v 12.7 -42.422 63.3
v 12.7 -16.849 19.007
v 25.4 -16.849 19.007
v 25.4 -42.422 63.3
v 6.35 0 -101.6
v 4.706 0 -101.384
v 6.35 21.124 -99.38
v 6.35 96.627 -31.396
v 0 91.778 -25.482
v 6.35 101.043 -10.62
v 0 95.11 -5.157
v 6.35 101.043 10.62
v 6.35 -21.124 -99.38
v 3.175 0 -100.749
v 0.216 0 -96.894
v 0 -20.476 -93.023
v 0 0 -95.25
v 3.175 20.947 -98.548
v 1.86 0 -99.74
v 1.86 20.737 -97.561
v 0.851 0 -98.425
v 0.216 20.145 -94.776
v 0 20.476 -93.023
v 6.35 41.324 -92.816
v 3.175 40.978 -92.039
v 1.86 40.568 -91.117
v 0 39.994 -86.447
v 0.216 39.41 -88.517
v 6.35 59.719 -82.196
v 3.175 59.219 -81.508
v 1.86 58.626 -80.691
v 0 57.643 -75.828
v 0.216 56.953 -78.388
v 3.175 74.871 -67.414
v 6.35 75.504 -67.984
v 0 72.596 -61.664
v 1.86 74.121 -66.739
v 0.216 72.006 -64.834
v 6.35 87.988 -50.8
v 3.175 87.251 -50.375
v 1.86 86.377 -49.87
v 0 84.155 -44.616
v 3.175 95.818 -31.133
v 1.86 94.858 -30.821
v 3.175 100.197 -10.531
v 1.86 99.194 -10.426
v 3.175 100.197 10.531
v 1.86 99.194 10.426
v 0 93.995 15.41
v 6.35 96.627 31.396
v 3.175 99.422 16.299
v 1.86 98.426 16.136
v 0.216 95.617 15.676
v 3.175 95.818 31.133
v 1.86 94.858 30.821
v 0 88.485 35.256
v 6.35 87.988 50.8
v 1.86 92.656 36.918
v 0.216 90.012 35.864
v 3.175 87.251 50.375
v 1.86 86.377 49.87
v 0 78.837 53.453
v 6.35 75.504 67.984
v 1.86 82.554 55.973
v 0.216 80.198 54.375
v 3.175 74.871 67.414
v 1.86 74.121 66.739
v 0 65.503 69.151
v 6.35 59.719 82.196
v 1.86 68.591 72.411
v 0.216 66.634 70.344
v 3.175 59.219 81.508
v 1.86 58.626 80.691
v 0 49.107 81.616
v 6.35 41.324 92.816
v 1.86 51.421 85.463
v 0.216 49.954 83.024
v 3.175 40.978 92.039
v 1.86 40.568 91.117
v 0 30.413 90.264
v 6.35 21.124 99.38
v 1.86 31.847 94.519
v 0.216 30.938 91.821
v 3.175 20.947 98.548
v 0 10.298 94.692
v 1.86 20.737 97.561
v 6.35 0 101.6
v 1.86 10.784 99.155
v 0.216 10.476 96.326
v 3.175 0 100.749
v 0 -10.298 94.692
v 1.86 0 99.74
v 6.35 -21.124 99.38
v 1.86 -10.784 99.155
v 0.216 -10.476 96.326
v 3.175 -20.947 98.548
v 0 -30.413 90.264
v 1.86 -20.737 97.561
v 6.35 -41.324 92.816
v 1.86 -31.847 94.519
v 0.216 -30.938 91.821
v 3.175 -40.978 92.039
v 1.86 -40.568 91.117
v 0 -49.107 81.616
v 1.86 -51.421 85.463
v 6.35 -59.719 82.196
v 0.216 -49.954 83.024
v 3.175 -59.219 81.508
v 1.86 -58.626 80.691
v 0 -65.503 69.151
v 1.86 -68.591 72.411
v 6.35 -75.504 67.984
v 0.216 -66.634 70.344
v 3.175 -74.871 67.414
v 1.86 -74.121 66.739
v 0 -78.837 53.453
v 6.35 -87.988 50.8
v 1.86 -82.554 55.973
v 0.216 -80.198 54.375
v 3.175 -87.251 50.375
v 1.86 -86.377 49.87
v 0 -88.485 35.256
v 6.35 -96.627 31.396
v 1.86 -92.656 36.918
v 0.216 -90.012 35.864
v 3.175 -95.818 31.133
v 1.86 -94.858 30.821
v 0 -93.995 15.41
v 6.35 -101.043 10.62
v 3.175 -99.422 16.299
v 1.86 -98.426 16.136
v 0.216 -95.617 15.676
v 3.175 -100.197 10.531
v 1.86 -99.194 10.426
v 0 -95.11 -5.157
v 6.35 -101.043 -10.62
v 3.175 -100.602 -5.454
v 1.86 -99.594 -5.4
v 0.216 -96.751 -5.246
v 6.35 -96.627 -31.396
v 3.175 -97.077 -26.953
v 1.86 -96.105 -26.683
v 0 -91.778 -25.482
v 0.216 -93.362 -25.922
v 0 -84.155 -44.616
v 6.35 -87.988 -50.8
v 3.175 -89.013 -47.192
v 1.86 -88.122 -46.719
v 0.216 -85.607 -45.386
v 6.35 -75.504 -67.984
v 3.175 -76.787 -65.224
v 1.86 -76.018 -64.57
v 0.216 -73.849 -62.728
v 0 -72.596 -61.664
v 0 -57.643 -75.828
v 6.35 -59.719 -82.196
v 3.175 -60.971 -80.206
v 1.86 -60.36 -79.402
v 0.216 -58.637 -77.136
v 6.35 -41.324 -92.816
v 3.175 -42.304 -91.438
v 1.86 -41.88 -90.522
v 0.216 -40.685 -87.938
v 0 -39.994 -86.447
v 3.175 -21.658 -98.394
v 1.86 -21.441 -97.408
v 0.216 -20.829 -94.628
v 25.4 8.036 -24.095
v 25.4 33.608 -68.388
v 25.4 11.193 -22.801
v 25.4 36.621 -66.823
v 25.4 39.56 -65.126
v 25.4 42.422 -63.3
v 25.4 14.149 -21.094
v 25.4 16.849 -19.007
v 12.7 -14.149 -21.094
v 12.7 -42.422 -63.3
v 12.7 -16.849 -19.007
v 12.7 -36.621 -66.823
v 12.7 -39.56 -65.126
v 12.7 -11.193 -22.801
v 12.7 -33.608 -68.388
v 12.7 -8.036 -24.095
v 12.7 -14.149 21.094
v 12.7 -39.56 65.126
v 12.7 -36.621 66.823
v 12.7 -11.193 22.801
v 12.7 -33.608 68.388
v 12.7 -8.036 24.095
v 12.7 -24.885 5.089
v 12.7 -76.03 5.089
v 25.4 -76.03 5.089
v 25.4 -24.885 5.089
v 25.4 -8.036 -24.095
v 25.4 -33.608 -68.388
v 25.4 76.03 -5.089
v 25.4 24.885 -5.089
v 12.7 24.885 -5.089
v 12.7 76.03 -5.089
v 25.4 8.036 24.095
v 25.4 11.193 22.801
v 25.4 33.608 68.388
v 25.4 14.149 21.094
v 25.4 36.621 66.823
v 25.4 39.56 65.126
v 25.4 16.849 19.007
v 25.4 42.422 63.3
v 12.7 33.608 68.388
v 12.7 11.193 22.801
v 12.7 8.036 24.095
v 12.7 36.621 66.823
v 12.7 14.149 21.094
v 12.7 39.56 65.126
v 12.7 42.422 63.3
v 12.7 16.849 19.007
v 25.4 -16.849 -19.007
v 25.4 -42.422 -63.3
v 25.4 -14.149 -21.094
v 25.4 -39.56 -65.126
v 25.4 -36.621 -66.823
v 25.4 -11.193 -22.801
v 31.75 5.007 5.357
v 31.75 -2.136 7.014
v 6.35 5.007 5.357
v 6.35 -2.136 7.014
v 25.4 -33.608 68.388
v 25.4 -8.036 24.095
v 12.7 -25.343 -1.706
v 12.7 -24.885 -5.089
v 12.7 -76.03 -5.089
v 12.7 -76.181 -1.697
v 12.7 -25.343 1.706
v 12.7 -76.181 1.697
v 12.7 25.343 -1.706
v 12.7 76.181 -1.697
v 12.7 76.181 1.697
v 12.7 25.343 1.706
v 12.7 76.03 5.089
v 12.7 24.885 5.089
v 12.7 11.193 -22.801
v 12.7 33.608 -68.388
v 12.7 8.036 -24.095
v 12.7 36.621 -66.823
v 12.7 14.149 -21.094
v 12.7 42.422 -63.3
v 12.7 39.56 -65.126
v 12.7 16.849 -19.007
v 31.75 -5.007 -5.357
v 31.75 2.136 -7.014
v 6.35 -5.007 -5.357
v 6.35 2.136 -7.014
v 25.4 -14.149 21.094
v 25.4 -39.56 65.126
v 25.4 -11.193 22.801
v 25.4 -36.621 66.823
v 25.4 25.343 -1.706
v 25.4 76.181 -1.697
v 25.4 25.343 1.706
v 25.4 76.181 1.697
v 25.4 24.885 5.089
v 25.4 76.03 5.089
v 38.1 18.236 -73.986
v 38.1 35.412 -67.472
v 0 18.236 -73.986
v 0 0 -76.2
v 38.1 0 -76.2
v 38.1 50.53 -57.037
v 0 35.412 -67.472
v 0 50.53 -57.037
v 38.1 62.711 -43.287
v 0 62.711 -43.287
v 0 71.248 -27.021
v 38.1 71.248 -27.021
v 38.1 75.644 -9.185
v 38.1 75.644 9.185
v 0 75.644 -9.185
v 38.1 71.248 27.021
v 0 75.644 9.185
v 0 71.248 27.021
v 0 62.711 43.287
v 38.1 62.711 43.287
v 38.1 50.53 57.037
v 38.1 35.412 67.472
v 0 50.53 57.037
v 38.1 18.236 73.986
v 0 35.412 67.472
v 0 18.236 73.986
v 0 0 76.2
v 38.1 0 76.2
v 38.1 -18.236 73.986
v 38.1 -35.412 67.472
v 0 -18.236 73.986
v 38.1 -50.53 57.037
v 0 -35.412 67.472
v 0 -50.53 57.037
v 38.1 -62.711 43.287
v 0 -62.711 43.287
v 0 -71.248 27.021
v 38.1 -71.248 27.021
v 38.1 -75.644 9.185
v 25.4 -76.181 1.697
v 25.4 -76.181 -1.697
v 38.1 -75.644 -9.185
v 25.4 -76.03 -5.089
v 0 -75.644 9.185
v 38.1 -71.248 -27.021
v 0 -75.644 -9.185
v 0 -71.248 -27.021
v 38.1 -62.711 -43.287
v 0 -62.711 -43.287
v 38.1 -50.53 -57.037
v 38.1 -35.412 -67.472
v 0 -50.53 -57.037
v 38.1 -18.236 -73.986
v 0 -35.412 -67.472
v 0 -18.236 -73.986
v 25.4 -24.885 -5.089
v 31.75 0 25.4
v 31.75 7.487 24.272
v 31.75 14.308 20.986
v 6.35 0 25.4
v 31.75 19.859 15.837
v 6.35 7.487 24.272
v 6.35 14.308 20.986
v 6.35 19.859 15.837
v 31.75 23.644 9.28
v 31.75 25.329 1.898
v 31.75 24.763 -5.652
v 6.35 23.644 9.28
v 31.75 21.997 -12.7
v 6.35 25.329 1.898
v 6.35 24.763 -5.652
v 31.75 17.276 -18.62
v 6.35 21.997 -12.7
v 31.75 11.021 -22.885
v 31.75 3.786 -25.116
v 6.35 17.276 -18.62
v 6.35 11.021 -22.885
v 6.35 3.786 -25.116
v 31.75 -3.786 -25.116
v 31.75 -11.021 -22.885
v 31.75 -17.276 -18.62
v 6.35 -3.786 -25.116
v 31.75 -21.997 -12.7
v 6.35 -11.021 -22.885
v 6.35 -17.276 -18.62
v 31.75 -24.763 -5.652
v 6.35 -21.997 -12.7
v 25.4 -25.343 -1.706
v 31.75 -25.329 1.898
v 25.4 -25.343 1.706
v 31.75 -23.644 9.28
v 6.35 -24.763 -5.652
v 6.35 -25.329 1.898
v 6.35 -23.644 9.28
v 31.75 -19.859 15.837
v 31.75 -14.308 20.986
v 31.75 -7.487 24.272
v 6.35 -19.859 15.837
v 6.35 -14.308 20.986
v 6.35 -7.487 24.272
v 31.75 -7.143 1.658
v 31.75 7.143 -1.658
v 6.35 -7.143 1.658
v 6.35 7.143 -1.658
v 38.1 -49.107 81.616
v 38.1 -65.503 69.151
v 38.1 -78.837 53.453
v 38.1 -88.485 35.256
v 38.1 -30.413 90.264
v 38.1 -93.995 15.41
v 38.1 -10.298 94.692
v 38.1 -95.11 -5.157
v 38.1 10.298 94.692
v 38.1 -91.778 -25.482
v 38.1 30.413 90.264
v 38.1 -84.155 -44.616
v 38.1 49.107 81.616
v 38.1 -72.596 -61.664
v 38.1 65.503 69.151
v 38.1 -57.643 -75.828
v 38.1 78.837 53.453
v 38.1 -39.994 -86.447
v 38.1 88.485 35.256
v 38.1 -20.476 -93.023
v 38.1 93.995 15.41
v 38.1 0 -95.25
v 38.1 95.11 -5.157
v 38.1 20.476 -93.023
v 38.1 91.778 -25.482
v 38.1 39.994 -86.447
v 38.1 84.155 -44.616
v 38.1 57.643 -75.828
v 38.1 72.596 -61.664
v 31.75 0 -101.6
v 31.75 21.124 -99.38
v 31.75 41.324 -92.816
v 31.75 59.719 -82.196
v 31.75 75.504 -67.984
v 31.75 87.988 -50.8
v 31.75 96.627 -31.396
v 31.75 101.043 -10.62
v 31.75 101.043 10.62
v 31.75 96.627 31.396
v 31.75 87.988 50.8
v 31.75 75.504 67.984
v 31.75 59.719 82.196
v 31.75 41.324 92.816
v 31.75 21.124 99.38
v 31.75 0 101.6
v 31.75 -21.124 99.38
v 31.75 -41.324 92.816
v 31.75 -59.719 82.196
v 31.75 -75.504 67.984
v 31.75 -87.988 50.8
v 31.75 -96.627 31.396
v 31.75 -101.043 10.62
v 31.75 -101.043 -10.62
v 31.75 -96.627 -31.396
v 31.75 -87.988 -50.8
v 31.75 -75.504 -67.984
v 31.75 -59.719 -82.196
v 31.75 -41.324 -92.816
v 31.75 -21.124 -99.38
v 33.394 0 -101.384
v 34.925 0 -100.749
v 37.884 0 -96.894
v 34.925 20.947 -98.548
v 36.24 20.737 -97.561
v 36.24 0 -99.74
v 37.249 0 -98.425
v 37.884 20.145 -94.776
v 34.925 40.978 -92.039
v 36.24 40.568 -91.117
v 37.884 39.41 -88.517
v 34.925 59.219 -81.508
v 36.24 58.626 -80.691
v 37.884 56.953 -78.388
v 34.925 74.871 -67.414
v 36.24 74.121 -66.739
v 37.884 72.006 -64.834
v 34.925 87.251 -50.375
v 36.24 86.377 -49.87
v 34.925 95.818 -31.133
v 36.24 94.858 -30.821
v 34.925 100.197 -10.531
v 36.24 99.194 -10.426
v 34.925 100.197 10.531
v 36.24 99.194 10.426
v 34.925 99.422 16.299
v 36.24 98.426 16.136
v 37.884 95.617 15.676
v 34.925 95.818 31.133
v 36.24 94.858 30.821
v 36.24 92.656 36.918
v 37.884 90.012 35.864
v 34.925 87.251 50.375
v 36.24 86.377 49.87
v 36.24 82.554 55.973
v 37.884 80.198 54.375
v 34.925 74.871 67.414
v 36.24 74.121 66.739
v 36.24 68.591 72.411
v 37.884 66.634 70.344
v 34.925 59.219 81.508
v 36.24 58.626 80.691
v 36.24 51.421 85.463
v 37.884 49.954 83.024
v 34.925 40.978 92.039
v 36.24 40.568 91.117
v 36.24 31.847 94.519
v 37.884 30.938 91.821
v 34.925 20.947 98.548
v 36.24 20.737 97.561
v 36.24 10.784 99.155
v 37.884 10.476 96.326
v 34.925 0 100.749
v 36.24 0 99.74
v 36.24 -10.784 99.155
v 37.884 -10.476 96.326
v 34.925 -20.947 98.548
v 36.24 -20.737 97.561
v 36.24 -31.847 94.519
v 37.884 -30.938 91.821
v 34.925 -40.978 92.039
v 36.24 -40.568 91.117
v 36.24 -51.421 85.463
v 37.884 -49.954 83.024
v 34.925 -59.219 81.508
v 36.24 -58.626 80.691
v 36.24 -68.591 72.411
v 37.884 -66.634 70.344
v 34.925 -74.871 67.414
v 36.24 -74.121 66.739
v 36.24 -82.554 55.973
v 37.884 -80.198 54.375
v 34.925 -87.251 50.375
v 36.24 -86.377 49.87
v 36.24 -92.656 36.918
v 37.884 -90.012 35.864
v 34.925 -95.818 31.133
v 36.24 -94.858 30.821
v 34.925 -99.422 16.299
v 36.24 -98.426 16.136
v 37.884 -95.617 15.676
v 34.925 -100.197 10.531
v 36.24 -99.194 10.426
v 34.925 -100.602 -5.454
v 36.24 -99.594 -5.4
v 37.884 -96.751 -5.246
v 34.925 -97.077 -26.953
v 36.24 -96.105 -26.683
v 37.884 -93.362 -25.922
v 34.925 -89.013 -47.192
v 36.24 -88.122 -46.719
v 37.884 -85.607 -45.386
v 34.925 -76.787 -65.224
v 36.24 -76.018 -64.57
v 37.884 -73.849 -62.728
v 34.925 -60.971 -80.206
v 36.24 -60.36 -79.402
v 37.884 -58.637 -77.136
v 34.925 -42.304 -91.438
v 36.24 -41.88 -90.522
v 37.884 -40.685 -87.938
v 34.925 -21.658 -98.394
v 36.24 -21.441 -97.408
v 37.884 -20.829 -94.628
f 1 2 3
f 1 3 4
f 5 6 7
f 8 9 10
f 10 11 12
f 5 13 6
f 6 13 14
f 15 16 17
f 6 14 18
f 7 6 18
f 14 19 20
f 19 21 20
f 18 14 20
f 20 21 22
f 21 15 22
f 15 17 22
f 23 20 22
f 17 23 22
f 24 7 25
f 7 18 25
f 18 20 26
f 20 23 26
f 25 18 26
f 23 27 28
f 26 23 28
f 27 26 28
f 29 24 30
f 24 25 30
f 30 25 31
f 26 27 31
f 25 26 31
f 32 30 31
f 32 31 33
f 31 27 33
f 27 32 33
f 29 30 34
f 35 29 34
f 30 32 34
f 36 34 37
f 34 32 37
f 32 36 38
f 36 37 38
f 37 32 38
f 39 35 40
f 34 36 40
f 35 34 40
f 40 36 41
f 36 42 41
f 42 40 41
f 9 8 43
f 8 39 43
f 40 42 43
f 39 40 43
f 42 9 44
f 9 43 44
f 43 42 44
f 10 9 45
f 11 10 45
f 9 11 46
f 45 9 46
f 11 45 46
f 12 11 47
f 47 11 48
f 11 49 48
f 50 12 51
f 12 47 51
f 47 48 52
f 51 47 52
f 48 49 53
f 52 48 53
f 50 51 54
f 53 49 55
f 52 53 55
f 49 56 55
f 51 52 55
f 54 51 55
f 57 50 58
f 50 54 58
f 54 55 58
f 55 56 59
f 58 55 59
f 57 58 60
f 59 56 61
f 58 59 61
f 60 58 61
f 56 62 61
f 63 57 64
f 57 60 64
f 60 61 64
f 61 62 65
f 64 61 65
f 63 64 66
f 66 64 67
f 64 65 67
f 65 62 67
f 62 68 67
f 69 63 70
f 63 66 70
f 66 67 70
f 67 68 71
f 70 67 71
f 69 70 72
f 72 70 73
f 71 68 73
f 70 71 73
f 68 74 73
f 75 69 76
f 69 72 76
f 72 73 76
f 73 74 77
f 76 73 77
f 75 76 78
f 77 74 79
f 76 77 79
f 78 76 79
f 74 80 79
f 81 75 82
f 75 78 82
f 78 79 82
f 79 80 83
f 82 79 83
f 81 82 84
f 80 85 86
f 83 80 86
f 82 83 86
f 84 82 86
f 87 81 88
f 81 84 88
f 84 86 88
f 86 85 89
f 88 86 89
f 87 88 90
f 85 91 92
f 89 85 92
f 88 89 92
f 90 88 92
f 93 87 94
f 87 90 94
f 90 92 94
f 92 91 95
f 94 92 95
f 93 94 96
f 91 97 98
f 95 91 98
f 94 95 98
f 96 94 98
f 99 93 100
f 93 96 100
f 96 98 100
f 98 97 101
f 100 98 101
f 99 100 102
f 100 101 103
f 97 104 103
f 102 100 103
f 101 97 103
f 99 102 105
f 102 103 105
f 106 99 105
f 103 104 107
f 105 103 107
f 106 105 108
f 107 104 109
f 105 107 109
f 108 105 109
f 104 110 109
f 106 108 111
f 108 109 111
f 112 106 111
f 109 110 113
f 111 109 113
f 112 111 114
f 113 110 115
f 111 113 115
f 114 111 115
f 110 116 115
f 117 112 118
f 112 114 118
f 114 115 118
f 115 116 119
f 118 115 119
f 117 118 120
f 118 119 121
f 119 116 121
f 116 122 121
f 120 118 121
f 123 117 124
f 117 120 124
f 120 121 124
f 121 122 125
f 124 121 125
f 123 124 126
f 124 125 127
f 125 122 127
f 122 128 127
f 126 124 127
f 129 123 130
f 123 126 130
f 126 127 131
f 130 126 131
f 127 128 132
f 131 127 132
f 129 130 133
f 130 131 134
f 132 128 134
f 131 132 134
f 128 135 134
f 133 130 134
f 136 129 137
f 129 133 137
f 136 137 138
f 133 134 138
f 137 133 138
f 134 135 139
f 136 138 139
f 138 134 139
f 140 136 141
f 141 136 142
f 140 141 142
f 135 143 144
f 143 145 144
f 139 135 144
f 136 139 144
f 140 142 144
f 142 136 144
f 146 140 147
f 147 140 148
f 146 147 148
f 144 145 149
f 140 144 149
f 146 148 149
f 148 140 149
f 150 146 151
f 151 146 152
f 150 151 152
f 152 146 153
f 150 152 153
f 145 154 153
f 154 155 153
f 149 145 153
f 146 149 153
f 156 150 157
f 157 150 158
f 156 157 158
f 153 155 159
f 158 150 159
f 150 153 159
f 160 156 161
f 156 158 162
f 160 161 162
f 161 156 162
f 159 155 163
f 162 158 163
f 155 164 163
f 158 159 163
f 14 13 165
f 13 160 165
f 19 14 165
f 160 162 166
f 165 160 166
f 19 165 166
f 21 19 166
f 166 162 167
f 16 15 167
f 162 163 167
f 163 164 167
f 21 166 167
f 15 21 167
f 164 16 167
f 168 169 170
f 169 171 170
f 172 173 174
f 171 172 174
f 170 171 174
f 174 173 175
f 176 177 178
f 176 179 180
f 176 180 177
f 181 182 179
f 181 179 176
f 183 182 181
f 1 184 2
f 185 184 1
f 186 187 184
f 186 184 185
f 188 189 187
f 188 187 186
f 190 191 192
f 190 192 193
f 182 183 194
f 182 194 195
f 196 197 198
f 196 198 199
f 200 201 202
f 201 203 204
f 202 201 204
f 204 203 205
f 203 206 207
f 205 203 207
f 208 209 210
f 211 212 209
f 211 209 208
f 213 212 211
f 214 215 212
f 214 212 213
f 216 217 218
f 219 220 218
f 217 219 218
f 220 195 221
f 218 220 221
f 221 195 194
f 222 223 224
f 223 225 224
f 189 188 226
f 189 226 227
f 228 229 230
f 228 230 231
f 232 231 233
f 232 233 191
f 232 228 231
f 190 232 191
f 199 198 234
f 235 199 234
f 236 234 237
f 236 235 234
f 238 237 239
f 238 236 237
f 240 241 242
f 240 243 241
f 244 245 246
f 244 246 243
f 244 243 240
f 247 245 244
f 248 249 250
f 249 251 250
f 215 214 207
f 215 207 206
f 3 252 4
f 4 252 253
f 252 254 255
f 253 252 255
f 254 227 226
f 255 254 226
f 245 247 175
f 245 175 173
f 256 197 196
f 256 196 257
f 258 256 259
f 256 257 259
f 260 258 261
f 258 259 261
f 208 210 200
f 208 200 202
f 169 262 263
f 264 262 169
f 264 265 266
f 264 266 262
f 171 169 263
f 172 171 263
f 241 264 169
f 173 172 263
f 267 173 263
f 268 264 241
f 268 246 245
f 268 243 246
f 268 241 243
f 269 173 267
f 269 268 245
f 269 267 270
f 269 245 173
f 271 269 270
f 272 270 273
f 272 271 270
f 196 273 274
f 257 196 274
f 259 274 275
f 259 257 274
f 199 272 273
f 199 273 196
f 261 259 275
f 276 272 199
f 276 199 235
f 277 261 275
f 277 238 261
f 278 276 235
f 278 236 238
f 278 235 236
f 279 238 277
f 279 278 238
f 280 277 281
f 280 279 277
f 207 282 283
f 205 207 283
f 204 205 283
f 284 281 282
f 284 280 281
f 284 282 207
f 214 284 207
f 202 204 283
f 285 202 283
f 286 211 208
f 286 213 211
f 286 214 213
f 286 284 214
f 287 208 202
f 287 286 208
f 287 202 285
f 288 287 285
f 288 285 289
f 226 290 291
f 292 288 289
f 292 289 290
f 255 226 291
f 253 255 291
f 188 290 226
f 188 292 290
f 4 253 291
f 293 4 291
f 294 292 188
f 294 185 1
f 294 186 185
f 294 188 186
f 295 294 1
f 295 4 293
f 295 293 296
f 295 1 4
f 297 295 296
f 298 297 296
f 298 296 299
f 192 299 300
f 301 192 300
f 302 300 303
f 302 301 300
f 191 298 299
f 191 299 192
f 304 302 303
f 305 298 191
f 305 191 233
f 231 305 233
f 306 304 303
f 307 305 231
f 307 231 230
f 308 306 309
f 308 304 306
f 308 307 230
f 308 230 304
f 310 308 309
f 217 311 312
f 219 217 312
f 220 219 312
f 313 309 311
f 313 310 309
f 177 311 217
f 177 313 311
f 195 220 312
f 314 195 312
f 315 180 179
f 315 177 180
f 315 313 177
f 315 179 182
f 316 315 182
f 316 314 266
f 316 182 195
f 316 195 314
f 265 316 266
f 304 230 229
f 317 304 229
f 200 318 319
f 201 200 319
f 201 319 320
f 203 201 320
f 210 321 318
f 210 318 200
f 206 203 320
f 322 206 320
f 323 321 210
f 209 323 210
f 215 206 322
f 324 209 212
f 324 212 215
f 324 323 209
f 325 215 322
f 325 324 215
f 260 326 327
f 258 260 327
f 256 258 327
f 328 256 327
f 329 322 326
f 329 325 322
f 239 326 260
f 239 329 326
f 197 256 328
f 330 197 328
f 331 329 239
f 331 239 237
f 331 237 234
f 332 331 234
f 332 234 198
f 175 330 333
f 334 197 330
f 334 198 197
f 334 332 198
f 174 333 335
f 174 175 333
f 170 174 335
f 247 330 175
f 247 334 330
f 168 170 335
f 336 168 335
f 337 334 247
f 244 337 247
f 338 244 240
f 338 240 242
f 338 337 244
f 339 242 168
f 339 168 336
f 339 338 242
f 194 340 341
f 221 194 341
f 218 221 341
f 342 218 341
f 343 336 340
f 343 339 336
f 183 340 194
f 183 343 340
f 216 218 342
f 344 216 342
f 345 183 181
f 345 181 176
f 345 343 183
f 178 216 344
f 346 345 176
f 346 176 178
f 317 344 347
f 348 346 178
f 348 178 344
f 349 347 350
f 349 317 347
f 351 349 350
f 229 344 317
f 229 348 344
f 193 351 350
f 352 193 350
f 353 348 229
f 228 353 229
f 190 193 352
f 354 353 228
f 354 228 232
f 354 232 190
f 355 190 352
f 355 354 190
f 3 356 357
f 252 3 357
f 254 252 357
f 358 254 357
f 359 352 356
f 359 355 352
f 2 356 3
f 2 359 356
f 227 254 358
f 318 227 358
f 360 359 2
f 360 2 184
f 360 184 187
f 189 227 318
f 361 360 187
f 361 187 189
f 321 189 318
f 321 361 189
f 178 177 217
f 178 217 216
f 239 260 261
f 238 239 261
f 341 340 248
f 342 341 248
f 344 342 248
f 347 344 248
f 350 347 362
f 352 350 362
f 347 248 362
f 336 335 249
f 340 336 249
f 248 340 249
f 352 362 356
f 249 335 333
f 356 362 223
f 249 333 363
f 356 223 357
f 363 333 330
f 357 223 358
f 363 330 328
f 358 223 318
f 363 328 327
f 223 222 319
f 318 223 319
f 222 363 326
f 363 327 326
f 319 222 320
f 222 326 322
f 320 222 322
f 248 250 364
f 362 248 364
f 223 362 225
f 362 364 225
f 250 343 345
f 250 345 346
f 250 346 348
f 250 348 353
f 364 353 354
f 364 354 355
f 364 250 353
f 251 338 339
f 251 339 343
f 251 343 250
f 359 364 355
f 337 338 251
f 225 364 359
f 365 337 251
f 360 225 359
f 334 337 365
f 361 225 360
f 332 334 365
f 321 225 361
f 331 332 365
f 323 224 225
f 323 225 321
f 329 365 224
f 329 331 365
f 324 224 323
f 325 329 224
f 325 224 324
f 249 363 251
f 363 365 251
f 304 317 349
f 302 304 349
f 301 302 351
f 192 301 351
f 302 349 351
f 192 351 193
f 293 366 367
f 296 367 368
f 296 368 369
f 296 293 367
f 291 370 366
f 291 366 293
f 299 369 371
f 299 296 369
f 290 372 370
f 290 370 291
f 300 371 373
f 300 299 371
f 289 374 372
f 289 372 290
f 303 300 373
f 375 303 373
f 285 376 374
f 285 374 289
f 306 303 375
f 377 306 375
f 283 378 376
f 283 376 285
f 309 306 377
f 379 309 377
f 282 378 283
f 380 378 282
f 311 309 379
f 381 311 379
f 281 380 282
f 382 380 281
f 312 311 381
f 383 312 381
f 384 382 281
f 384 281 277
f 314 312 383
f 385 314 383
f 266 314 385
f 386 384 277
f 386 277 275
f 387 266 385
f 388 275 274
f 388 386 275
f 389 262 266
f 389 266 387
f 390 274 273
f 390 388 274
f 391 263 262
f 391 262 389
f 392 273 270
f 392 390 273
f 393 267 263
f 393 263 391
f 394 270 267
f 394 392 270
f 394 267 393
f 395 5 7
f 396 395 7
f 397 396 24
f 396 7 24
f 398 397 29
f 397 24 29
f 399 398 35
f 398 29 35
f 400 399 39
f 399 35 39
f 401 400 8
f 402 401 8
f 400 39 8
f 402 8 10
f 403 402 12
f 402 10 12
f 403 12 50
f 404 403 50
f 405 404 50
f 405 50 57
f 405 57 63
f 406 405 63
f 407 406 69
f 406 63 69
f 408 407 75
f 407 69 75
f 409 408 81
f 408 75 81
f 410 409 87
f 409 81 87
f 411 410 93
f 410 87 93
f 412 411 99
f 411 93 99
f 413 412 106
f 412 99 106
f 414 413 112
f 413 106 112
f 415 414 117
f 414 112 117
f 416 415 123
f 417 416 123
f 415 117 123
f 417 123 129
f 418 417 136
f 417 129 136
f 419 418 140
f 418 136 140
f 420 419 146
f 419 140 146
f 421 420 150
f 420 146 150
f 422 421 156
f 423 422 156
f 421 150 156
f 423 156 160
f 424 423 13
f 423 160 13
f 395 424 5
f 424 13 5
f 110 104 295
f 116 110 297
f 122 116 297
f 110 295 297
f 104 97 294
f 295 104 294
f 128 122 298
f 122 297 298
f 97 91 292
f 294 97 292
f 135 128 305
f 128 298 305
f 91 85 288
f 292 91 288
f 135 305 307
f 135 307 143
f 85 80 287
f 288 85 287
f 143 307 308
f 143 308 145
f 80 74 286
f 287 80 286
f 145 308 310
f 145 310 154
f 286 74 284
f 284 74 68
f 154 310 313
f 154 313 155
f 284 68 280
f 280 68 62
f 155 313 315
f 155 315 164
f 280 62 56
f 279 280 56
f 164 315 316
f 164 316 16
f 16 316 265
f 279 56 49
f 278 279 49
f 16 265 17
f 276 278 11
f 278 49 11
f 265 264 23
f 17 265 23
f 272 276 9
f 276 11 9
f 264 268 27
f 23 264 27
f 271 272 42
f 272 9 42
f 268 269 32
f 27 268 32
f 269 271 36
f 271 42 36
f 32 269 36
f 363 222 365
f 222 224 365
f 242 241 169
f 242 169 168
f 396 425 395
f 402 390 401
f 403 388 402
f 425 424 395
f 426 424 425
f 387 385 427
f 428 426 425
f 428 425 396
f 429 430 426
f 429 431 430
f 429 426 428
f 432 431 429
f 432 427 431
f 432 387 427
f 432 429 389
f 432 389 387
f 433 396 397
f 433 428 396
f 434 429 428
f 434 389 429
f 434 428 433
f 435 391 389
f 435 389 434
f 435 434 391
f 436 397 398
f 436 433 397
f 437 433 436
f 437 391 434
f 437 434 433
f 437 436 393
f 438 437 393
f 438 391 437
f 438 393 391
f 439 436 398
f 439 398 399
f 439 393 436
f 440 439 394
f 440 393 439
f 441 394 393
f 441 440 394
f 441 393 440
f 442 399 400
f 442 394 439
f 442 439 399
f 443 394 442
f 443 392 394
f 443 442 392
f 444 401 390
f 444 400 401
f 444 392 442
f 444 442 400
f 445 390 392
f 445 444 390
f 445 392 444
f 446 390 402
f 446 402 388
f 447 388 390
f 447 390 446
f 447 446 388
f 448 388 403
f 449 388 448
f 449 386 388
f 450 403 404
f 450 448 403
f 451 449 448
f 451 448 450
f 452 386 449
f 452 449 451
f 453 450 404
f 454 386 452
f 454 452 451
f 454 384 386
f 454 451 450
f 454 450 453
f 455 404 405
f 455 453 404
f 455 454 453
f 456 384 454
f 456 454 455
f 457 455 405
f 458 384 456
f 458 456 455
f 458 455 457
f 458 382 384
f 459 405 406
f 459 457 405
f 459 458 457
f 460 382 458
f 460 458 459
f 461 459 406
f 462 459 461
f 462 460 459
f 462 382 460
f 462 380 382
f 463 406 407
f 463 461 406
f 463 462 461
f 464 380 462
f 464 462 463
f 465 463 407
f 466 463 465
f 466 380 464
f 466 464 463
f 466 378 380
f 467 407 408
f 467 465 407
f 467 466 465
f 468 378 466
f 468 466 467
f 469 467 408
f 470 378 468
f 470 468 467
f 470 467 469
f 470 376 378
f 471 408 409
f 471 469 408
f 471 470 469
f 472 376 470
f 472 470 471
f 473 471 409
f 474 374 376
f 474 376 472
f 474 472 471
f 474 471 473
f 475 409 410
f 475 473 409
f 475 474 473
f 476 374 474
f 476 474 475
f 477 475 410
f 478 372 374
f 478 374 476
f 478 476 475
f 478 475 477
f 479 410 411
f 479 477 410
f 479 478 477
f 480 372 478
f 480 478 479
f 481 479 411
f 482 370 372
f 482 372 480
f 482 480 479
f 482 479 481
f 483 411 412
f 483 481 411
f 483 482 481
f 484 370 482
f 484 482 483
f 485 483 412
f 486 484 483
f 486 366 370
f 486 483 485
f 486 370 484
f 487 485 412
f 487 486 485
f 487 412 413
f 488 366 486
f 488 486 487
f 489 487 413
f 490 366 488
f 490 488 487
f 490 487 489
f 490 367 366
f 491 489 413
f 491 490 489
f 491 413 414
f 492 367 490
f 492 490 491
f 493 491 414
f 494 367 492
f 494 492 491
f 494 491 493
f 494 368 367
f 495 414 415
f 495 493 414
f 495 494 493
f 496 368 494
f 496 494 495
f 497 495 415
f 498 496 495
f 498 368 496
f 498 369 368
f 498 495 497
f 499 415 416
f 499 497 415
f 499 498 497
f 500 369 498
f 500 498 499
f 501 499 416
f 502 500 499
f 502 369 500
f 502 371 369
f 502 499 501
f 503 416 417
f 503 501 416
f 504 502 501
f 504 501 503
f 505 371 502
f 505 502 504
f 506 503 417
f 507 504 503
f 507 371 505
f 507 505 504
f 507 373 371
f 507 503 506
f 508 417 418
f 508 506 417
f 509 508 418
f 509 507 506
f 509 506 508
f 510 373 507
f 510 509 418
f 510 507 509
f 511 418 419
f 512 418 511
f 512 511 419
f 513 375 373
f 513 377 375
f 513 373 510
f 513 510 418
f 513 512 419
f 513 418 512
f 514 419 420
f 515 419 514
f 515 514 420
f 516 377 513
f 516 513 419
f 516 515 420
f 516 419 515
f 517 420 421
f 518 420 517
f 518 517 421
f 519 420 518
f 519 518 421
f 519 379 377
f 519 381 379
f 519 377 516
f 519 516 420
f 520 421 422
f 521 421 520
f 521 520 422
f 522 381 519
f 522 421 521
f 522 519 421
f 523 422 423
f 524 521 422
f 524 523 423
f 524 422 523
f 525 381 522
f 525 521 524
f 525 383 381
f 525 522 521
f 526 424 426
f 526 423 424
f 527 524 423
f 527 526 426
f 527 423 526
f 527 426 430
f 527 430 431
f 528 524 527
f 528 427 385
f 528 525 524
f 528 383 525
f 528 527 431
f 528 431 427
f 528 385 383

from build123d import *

# Parameters (mm, degrees)
SKETCH1_R                = 101.6
SKETCH1_R_2              = 76.2
BOSS_EXTRUDE1_DEPTH      = 38.1
FILLET1_R                = 6.35
SKETCH2_R                = 25.4
BOSS_EXTRUDE2_DEPTH      = 12.7
BOSS_EXTRUDE2_DEPTH_BACK = 12.7
SKETCH3_W                = 10.17723869
SKETCH3_H                = 65.923797021
BOSS_EXTRUDE3_DEPTH      = 6.35
BOSS_EXTRUDE3_DEPTH_BACK = 6.35


with BuildPart() as part:
    # Sketch1 → Boss-Extrude1 (new body)
    with BuildSketch(Plane(origin=(0, 0, 0), x_dir=(0, 0, -1), z_dir=(1, 0, 0))):
        Circle(SKETCH1_R)
        Circle(SKETCH1_R_2, mode=Mode.SUBTRACT)
    extrude(amount=BOSS_EXTRUDE1_DEPTH)

    # Fillet1
    fillet1_edges = [part.edges().sort_by_distance(p)[0] for p in [
        (0, 0, 101.6),
        (38.1, 0, 101.6),
    ]]
    fillet(fillet1_edges, radius=FILLET1_R)



with BuildPart() as body_2:
    # Sketch2 → Boss-Extrude2 (new body, two sides)
    with BuildSketch(Plane.ZY.offset(-19.05)) as boss_extrude2_sk:
        Circle(SKETCH2_R)
        Polygon((-5.356755209, -5.00684601), (1.657678233, -7.142509098), (7.014433442, -2.135663088), (5.356755209, 5.00684601), (-1.657678233, 7.142509098), (-7.014433442, 2.135663088), align=None, mode=Mode.SUBTRACT)
    extrude(amount=BOSS_EXTRUDE2_DEPTH)
    extrude(boss_extrude2_sk.sketch, amount=-BOSS_EXTRUDE2_DEPTH_BACK)


with BuildPart() as part_1:
    add(part.part)

    add(body_2.part)  # Boss-Extrude3 merges body 2
    # Sketch3 → Boss-Extrude3 (add, two sides)
    with BuildSketch(Plane.ZY.offset(-19.05)) as boss_extrude3_sk:
        Polygon((6.933069311, 9.87864093), (12.021688656, 1.064893684), (69.11337159, 34.026792195), (64.024752245, 42.840539441), align=None)
        with Locations((0, 43.905433126)):
            Rectangle(SKETCH3_W, SKETCH3_H)
        Polygon((12.021688656, -1.064893684), (6.933069311, -9.87864093), (64.024752245, -42.840539441), (69.11337159, -34.026792195), align=None)
        with Locations((0, -43.905433126)):
            Rectangle(SKETCH3_W, SKETCH3_H)
        Polygon((-6.933069311, -9.87864093), (-12.021688656, -1.064893684), (-69.11337159, -34.026792195), (-64.024752245, -42.840539441), align=None)
        Polygon((-12.021688656, 1.064893684), (-6.933069311, 9.87864093), (-64.024752245, 42.840539441), (-69.11337159, 34.026792195), align=None)
    extrude(amount=BOSS_EXTRUDE3_DEPTH)
    extrude(boss_extrude3_sk.sketch, amount=-BOSS_EXTRUDE3_DEPTH_BACK)


solid = part_1.part
